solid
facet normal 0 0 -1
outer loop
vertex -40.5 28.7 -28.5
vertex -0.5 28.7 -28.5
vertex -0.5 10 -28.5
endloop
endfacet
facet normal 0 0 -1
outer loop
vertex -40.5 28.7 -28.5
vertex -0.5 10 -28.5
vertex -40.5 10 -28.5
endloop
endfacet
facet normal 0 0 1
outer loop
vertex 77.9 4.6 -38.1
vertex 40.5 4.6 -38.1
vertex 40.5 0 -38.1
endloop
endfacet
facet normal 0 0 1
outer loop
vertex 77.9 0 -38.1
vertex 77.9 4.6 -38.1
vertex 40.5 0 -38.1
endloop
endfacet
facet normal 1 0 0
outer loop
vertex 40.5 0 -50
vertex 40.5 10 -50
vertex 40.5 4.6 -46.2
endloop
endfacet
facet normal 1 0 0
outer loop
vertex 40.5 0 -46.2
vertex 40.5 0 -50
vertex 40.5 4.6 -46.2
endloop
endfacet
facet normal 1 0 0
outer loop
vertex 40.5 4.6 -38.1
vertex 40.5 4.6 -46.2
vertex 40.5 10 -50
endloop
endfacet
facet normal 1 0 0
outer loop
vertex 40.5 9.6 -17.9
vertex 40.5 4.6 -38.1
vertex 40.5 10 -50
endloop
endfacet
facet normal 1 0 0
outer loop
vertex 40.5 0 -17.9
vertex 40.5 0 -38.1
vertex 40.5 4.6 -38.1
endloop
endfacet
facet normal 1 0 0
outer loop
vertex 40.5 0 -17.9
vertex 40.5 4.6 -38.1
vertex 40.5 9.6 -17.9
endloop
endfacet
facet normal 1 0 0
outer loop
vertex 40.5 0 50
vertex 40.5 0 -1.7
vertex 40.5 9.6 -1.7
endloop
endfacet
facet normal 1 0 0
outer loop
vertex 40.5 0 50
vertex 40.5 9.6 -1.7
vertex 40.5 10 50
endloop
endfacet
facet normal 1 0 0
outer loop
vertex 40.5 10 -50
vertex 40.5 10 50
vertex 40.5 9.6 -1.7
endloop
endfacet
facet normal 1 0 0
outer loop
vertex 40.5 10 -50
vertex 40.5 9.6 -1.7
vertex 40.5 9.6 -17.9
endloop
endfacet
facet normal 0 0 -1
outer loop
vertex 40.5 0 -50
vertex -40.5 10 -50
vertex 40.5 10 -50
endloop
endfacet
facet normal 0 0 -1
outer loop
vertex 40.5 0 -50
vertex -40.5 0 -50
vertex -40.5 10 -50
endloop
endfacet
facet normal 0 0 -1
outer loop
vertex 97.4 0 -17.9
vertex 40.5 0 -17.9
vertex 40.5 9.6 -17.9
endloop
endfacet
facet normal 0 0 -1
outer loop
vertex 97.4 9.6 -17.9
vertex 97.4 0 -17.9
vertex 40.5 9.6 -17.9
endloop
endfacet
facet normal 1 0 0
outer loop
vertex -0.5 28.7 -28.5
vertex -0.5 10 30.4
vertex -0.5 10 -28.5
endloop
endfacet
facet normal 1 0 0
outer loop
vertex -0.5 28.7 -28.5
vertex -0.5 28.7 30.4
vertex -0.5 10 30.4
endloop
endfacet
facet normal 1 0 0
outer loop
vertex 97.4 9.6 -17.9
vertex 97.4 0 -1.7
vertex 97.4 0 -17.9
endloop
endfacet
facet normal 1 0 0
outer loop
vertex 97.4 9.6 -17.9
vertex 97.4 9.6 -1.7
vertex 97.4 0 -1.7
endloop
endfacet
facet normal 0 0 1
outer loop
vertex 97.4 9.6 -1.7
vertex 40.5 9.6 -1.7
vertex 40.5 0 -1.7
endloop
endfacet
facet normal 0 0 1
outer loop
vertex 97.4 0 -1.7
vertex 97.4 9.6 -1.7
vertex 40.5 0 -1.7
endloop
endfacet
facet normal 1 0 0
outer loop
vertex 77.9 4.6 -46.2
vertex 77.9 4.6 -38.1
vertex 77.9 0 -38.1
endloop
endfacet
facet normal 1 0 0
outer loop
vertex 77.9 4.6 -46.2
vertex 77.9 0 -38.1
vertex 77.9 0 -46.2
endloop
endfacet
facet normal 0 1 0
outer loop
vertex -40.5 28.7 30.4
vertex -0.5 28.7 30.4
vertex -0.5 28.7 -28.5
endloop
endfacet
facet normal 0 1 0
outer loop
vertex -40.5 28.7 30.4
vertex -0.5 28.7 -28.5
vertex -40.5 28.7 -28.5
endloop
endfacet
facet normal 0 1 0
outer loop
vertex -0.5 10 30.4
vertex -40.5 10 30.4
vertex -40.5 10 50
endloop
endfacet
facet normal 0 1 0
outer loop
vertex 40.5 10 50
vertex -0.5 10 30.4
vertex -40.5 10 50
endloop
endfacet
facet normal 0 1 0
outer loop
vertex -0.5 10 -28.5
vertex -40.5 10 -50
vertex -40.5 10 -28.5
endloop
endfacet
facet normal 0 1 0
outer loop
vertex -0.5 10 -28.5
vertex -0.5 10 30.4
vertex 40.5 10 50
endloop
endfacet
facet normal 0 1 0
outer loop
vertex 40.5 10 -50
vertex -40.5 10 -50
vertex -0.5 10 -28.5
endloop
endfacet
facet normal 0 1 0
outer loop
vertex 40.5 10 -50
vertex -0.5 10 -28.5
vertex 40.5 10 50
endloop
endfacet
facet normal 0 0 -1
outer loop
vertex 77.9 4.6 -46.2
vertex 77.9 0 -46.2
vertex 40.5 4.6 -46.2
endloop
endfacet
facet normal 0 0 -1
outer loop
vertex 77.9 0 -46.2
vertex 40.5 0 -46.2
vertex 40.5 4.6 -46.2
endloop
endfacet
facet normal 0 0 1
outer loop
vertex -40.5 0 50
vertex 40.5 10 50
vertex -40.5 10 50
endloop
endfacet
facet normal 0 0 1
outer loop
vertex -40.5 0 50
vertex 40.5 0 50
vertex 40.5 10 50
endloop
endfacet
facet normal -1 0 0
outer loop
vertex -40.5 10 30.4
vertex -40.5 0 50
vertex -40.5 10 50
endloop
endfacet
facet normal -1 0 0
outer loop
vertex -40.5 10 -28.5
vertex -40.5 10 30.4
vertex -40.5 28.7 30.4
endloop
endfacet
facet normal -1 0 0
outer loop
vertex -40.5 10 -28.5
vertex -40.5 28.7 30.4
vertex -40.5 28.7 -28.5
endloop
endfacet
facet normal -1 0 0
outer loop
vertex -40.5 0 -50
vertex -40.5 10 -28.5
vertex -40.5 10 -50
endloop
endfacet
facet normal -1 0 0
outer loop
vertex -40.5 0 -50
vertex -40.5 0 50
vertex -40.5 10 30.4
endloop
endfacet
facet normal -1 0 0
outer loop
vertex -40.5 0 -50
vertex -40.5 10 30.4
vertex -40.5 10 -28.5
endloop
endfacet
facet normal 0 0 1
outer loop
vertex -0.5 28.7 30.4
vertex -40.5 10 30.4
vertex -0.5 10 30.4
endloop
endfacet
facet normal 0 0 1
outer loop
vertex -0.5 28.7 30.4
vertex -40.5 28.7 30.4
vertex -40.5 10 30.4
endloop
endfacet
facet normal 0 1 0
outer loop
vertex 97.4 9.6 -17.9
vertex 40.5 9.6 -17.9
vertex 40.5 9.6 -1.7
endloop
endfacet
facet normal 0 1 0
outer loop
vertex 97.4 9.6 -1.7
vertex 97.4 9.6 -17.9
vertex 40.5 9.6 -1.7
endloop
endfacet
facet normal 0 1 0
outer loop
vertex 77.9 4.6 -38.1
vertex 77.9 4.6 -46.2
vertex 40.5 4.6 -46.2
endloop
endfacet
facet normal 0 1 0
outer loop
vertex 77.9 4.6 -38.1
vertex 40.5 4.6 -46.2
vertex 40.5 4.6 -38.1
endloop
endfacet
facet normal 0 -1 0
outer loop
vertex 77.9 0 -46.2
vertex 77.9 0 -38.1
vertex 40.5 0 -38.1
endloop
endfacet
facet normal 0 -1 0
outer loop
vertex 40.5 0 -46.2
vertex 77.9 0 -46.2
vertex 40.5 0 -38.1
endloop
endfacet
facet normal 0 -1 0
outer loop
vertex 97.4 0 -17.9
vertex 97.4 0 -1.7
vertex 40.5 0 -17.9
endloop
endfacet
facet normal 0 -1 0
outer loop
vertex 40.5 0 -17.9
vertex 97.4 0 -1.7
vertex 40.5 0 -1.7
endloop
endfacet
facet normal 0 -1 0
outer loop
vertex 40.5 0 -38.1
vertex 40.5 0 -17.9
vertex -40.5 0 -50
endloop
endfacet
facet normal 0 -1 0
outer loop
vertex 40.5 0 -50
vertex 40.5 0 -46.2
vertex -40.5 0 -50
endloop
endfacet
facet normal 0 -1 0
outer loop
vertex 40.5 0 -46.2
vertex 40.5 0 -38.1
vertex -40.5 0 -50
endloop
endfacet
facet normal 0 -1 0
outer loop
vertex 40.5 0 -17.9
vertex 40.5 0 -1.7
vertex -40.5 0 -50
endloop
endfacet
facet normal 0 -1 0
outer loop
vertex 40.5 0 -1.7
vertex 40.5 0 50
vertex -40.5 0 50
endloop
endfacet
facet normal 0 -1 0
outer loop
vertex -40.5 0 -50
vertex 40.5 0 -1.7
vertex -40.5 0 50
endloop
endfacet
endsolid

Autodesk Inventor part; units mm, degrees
ref_plane "YZ Plane" through (0, 0, 0) normal (1, 0, 0) x (0, 1, 0)
ref_plane "XZ Plane" through (0, 0, 0) normal (0, 1, 0) x (-1, 0, 0)
ref_plane "XY Plane" through (0, 0, 0) normal (0, 0, 1) x (1, 0, 0)
sketch "Sketch1" plane through (0, 0, 0) normal (0, 1, 0) x (-1, 0, 0)
  line L0 (-40.5, 50) -> (40.5, 50)
  line L1 (40.5, 50) -> (40.5, -50)
  line L2 (40.5, -50) -> (-40.5, -50)
  line L3 (-40.5, -50) -> (-40.5, 50)
  line L4 (-40.5, 50) -> (40.5, -50) construction
  line L5 (40.5, 50) -> (-40.5, -50) construction
  point P0 (0, 0)
  dimension "d0" = 81
  dimension "d1" = 100
extrude "Extrusion1" add sketch "Sketch1" along normal blind 28.7
sketch "Sketch2" plane through (40.5, 0, 50) normal (1, 0, 0) x (0, 0, -1)
  line L0 (100, 0) -> (0, 0) projected
  line L1 (67.9, 0) -> (67.9, 9.6)
  line L2 (67.9, 9.6) -> (51.7, 9.6)
  line L3 (51.7, 9.6) -> (51.7, 0)
  line L4 (51.7, 0) -> (67.9, 0)
  point P0 (50, 0)
  dimension "d5" = 9.6
  dimension "d6" = 16.2
extrude "Extrusion2" add sketch "Sketch2" along normal blind 56.9
sketch "Sketch3" plane through (40.5, 0, -50) normal (1, 0, 0) x (0, 0, -1)
  line L0 (-32.1, 0) -> (0, 0) projected
  line L1 (0, 0) -> (-3.8, 0)
  line L2 (-3.8, 0) -> (-3.8, 4.6)
  line L3 (-3.8, 4.6) -> (-11.9, 4.6)
  line L4 (-11.9, 4.6) -> (-11.9, 0)
  line L5 (-11.9, 0) -> (-3.8, 0)
  point P0 (-50, 0)
  dimension "d9" = 3.8
  dimension "d10" = 4.6
  dimension "d11" = 8.1
extrude "Extrusion3" add sketch "Sketch3" along normal blind 37.4
sketch "Sketch4" plane through (0, 28.7, 0) normal (0, 1, 0) x (1, 0, 0)
  line L0 (-40.5, 50) -> (-40.5, -50) projected
  line L1 (-40.5, -50) -> (-40.5, -30.4)
  line L2 (-40.5, -30.4) -> (-0.5, -30.4)
  line L3 (-0.5, -30.4) -> (-0.5, 28.5)
  line L4 (-0.5, 28.5) -> (-40.5, 28.5)
  line L5 (-40.5, 28.5) -> (-40.5, -30.4)
  line L6 (-40.5, -50) -> (40.5, -50) projected
  line L7 (-40.5, -50) -> (40.5, -50)
  line L8 (40.5, -50) -> (40.5, 50)
  line L9 (40.5, 38.1) -> (77.9, 38.1) projected
  line L10 (40.5, 50) -> (-40.5, 50) projected
  line L11 (40.5, 50) -> (-40.5, 50)
  line L12 (-40.5, 50) -> (-40.5, 28.5)
  point P0 (0, 0)
  dimension "d14" = 19.6
  dimension "d15" = 40
  dimension "d16" = 58.9
extrude "Extrusion4" cut sketch "Sketch4" against normal blind 18.7 contours L10 L8 L6 L0 L2 L3 L4
properties part number "NVidia"
